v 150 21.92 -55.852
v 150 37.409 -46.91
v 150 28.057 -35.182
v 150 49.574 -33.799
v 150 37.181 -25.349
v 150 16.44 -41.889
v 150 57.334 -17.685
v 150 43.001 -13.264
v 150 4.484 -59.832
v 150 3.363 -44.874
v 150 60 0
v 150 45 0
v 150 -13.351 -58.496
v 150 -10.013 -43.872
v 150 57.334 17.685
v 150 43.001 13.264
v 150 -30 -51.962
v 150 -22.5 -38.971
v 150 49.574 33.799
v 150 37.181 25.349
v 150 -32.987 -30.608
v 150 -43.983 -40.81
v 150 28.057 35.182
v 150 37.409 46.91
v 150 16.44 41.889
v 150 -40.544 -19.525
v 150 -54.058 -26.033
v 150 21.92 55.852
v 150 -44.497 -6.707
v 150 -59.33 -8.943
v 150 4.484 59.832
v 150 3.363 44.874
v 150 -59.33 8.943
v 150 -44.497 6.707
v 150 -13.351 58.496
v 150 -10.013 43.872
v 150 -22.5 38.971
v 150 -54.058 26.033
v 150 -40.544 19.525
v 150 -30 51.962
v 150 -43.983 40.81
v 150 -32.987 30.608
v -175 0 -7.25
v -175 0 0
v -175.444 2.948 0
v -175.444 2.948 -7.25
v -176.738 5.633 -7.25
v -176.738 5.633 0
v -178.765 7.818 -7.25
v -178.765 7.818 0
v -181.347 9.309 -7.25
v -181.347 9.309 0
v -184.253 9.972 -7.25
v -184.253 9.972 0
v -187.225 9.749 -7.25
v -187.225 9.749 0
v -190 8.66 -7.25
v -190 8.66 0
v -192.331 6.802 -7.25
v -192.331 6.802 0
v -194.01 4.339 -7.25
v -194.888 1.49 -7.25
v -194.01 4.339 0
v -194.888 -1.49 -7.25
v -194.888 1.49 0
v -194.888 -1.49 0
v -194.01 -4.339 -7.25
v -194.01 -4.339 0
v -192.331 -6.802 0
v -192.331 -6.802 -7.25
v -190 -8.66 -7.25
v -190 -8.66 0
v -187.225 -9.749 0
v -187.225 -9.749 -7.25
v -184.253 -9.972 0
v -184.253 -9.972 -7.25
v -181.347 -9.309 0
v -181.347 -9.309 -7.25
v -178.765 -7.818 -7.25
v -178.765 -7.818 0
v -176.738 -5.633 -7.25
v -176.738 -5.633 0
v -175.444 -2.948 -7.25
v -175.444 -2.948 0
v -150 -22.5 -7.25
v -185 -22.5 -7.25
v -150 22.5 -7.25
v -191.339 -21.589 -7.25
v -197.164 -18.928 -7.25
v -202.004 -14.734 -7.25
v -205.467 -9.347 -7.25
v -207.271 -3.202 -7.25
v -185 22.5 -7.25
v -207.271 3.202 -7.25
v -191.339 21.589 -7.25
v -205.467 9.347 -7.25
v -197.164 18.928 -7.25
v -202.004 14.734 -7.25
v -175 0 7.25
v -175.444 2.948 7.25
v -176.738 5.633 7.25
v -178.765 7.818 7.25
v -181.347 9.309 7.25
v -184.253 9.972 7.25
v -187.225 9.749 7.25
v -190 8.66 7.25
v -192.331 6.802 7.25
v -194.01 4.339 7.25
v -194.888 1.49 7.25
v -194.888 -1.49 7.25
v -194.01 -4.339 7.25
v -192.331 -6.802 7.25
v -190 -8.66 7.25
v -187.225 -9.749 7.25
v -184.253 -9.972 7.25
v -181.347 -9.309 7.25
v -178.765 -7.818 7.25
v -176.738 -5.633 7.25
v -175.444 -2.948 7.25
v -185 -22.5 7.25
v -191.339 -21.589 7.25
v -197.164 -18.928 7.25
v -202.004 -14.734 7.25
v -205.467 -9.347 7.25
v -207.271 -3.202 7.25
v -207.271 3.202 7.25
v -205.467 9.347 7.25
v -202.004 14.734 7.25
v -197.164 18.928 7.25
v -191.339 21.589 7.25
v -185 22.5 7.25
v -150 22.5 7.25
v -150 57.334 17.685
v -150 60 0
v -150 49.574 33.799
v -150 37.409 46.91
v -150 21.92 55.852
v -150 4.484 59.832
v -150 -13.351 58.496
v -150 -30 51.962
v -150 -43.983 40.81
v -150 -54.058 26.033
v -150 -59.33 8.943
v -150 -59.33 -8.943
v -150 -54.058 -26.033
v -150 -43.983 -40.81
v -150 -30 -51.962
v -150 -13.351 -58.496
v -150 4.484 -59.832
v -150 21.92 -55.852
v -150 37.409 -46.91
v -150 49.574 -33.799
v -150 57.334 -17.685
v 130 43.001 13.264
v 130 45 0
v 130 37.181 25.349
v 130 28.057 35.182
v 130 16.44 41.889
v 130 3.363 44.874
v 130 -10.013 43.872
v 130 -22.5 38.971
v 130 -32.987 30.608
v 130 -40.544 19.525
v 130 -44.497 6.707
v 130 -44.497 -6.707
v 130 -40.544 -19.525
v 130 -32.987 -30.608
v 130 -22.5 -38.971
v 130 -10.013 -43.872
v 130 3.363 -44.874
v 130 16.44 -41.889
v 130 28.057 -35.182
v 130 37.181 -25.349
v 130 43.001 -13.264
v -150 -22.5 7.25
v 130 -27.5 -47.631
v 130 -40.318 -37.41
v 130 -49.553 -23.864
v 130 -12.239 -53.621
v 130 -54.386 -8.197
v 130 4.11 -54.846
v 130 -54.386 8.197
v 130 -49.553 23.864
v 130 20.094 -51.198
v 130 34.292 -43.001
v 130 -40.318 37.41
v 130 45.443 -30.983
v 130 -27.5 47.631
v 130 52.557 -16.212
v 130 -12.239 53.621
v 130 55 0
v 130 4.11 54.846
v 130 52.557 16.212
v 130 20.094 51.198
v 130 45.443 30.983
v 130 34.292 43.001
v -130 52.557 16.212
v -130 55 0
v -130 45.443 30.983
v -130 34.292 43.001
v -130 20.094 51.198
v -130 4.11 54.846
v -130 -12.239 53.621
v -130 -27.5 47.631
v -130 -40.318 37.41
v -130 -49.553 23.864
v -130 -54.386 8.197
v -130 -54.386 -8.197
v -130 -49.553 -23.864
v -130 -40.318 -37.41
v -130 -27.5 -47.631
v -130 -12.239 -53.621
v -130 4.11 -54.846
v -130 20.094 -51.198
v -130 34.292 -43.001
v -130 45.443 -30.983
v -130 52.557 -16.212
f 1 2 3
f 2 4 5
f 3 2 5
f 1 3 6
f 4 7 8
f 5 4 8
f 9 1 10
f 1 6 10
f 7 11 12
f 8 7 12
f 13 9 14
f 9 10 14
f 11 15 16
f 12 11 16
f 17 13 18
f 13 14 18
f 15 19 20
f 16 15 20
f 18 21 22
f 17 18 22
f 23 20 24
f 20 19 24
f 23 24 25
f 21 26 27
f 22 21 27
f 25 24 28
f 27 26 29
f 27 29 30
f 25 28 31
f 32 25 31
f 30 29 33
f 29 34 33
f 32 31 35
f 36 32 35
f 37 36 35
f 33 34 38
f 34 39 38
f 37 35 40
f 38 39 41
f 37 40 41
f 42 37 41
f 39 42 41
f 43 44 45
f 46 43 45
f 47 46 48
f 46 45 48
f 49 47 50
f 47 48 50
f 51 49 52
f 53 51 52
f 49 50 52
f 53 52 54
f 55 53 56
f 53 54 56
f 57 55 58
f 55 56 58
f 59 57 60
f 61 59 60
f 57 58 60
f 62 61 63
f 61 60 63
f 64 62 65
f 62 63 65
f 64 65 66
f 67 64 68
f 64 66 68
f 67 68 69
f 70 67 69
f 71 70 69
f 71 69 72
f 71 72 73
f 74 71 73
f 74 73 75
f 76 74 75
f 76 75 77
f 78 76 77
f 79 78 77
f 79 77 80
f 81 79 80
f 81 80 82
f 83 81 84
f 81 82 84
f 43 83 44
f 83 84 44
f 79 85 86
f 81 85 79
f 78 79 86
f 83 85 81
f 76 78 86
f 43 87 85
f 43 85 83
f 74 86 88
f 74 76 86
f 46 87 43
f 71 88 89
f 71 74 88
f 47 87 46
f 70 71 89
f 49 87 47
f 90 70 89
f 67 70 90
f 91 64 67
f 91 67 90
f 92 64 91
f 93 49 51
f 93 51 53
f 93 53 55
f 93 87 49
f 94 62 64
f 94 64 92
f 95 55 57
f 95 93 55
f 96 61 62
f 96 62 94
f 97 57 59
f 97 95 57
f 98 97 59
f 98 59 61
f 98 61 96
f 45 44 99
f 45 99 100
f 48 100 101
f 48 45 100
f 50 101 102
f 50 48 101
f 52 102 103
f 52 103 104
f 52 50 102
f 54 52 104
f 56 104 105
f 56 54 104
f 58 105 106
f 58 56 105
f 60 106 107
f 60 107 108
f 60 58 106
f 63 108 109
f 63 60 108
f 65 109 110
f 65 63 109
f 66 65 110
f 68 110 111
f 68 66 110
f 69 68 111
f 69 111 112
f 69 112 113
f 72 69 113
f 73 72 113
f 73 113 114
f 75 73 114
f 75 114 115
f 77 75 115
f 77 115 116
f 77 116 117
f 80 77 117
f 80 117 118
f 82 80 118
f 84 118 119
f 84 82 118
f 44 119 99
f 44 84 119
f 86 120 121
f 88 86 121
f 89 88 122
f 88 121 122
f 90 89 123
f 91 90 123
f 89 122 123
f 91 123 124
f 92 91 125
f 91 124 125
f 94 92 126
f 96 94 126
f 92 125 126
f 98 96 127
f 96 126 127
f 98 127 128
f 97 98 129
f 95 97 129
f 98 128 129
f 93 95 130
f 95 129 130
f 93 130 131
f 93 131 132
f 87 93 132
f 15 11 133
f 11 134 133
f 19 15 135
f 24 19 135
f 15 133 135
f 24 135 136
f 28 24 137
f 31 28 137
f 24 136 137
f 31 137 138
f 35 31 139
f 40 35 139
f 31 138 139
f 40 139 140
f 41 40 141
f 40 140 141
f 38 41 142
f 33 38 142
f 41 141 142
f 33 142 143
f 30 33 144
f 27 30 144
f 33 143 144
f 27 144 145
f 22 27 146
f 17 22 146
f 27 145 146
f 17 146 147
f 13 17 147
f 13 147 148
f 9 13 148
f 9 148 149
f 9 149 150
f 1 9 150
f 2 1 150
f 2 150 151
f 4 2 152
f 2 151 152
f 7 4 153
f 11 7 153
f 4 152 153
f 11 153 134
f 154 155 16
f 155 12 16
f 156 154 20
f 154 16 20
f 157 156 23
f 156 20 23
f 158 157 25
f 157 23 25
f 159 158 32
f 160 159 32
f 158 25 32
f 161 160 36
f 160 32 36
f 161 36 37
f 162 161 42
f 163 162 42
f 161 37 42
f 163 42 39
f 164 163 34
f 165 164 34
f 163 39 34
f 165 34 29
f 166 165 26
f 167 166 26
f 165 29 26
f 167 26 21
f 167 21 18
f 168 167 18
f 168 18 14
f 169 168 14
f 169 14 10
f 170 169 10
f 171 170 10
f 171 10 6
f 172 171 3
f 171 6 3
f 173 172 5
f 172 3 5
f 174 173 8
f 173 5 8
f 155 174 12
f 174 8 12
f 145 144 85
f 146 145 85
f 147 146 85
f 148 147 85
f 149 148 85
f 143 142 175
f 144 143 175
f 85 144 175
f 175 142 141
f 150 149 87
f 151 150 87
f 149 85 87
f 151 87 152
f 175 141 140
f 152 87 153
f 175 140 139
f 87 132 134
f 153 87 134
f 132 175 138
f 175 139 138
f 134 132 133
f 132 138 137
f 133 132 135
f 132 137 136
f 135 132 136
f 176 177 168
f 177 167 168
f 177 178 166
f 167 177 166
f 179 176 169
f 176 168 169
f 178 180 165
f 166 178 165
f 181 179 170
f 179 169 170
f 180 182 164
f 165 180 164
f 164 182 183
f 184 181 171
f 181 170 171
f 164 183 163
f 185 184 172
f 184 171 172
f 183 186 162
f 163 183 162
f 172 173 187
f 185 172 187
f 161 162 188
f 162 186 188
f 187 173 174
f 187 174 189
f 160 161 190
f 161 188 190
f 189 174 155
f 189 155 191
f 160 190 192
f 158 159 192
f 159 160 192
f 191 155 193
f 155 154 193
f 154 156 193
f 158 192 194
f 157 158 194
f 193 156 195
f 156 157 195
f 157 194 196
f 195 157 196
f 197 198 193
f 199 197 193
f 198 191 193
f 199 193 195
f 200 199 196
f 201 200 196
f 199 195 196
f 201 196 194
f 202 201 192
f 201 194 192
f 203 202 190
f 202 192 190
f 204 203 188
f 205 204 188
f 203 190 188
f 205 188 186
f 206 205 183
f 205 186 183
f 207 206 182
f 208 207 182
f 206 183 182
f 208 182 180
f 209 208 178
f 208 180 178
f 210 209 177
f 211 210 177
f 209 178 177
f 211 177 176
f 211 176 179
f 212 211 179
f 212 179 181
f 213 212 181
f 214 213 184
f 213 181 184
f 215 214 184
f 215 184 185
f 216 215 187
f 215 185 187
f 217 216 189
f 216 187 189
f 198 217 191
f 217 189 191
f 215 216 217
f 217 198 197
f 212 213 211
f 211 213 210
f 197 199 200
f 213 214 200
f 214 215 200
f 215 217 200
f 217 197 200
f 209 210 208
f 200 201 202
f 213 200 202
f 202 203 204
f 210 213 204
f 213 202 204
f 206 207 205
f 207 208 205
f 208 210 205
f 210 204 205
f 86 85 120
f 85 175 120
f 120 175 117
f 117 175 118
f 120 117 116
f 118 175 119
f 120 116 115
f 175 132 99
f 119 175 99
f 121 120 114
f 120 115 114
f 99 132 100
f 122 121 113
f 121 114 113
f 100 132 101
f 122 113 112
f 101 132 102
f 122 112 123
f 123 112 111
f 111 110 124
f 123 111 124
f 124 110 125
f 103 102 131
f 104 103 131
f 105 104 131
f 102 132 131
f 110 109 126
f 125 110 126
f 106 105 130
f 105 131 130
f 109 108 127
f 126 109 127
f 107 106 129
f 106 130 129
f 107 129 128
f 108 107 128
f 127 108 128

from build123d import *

# Parameters (mm, degrees)
BOSS_EXTRUDE1_DEPTH      = 7.25
BOSS_EXTRUDE1_DEPTH_BACK = 7.25
SKETCH3_R                = 10


with BuildPart() as part:
    # Sketch1 → Revolve1 (revolve)
    with BuildSketch(Plane.XY):
        Polygon((150, 45), (150, 60), (-150, 60), (-150, 0), (-130, 0), (-130, 55), (130, 55), (130, 45), align=None)
    revolve(axis=Axis((-150, 0, 0), (1, 0, 0)))

    # Sketch3 → Boss-Extrude1 (add, two sides: drawn at the far end of the back side and taken through both)
    with BuildSketch(Plane.XY.offset(-BOSS_EXTRUDE1_DEPTH_BACK)):
        with BuildLine():
            Line((-150, 22.5), (-150, -22.5))
            Line((-150, -22.5), (-185, -22.5))
            ThreePointArc((-185, -22.5), (-207.5, 0), (-185, 22.5))
            Line((-185, 22.5), (-150, 22.5))
        make_face()
        with Locations((-185, 0)):
            Circle(SKETCH3_R, mode=Mode.SUBTRACT)
    extrude(amount=BOSS_EXTRUDE1_DEPTH + BOSS_EXTRUDE1_DEPTH_BACK)


solid = part.part
